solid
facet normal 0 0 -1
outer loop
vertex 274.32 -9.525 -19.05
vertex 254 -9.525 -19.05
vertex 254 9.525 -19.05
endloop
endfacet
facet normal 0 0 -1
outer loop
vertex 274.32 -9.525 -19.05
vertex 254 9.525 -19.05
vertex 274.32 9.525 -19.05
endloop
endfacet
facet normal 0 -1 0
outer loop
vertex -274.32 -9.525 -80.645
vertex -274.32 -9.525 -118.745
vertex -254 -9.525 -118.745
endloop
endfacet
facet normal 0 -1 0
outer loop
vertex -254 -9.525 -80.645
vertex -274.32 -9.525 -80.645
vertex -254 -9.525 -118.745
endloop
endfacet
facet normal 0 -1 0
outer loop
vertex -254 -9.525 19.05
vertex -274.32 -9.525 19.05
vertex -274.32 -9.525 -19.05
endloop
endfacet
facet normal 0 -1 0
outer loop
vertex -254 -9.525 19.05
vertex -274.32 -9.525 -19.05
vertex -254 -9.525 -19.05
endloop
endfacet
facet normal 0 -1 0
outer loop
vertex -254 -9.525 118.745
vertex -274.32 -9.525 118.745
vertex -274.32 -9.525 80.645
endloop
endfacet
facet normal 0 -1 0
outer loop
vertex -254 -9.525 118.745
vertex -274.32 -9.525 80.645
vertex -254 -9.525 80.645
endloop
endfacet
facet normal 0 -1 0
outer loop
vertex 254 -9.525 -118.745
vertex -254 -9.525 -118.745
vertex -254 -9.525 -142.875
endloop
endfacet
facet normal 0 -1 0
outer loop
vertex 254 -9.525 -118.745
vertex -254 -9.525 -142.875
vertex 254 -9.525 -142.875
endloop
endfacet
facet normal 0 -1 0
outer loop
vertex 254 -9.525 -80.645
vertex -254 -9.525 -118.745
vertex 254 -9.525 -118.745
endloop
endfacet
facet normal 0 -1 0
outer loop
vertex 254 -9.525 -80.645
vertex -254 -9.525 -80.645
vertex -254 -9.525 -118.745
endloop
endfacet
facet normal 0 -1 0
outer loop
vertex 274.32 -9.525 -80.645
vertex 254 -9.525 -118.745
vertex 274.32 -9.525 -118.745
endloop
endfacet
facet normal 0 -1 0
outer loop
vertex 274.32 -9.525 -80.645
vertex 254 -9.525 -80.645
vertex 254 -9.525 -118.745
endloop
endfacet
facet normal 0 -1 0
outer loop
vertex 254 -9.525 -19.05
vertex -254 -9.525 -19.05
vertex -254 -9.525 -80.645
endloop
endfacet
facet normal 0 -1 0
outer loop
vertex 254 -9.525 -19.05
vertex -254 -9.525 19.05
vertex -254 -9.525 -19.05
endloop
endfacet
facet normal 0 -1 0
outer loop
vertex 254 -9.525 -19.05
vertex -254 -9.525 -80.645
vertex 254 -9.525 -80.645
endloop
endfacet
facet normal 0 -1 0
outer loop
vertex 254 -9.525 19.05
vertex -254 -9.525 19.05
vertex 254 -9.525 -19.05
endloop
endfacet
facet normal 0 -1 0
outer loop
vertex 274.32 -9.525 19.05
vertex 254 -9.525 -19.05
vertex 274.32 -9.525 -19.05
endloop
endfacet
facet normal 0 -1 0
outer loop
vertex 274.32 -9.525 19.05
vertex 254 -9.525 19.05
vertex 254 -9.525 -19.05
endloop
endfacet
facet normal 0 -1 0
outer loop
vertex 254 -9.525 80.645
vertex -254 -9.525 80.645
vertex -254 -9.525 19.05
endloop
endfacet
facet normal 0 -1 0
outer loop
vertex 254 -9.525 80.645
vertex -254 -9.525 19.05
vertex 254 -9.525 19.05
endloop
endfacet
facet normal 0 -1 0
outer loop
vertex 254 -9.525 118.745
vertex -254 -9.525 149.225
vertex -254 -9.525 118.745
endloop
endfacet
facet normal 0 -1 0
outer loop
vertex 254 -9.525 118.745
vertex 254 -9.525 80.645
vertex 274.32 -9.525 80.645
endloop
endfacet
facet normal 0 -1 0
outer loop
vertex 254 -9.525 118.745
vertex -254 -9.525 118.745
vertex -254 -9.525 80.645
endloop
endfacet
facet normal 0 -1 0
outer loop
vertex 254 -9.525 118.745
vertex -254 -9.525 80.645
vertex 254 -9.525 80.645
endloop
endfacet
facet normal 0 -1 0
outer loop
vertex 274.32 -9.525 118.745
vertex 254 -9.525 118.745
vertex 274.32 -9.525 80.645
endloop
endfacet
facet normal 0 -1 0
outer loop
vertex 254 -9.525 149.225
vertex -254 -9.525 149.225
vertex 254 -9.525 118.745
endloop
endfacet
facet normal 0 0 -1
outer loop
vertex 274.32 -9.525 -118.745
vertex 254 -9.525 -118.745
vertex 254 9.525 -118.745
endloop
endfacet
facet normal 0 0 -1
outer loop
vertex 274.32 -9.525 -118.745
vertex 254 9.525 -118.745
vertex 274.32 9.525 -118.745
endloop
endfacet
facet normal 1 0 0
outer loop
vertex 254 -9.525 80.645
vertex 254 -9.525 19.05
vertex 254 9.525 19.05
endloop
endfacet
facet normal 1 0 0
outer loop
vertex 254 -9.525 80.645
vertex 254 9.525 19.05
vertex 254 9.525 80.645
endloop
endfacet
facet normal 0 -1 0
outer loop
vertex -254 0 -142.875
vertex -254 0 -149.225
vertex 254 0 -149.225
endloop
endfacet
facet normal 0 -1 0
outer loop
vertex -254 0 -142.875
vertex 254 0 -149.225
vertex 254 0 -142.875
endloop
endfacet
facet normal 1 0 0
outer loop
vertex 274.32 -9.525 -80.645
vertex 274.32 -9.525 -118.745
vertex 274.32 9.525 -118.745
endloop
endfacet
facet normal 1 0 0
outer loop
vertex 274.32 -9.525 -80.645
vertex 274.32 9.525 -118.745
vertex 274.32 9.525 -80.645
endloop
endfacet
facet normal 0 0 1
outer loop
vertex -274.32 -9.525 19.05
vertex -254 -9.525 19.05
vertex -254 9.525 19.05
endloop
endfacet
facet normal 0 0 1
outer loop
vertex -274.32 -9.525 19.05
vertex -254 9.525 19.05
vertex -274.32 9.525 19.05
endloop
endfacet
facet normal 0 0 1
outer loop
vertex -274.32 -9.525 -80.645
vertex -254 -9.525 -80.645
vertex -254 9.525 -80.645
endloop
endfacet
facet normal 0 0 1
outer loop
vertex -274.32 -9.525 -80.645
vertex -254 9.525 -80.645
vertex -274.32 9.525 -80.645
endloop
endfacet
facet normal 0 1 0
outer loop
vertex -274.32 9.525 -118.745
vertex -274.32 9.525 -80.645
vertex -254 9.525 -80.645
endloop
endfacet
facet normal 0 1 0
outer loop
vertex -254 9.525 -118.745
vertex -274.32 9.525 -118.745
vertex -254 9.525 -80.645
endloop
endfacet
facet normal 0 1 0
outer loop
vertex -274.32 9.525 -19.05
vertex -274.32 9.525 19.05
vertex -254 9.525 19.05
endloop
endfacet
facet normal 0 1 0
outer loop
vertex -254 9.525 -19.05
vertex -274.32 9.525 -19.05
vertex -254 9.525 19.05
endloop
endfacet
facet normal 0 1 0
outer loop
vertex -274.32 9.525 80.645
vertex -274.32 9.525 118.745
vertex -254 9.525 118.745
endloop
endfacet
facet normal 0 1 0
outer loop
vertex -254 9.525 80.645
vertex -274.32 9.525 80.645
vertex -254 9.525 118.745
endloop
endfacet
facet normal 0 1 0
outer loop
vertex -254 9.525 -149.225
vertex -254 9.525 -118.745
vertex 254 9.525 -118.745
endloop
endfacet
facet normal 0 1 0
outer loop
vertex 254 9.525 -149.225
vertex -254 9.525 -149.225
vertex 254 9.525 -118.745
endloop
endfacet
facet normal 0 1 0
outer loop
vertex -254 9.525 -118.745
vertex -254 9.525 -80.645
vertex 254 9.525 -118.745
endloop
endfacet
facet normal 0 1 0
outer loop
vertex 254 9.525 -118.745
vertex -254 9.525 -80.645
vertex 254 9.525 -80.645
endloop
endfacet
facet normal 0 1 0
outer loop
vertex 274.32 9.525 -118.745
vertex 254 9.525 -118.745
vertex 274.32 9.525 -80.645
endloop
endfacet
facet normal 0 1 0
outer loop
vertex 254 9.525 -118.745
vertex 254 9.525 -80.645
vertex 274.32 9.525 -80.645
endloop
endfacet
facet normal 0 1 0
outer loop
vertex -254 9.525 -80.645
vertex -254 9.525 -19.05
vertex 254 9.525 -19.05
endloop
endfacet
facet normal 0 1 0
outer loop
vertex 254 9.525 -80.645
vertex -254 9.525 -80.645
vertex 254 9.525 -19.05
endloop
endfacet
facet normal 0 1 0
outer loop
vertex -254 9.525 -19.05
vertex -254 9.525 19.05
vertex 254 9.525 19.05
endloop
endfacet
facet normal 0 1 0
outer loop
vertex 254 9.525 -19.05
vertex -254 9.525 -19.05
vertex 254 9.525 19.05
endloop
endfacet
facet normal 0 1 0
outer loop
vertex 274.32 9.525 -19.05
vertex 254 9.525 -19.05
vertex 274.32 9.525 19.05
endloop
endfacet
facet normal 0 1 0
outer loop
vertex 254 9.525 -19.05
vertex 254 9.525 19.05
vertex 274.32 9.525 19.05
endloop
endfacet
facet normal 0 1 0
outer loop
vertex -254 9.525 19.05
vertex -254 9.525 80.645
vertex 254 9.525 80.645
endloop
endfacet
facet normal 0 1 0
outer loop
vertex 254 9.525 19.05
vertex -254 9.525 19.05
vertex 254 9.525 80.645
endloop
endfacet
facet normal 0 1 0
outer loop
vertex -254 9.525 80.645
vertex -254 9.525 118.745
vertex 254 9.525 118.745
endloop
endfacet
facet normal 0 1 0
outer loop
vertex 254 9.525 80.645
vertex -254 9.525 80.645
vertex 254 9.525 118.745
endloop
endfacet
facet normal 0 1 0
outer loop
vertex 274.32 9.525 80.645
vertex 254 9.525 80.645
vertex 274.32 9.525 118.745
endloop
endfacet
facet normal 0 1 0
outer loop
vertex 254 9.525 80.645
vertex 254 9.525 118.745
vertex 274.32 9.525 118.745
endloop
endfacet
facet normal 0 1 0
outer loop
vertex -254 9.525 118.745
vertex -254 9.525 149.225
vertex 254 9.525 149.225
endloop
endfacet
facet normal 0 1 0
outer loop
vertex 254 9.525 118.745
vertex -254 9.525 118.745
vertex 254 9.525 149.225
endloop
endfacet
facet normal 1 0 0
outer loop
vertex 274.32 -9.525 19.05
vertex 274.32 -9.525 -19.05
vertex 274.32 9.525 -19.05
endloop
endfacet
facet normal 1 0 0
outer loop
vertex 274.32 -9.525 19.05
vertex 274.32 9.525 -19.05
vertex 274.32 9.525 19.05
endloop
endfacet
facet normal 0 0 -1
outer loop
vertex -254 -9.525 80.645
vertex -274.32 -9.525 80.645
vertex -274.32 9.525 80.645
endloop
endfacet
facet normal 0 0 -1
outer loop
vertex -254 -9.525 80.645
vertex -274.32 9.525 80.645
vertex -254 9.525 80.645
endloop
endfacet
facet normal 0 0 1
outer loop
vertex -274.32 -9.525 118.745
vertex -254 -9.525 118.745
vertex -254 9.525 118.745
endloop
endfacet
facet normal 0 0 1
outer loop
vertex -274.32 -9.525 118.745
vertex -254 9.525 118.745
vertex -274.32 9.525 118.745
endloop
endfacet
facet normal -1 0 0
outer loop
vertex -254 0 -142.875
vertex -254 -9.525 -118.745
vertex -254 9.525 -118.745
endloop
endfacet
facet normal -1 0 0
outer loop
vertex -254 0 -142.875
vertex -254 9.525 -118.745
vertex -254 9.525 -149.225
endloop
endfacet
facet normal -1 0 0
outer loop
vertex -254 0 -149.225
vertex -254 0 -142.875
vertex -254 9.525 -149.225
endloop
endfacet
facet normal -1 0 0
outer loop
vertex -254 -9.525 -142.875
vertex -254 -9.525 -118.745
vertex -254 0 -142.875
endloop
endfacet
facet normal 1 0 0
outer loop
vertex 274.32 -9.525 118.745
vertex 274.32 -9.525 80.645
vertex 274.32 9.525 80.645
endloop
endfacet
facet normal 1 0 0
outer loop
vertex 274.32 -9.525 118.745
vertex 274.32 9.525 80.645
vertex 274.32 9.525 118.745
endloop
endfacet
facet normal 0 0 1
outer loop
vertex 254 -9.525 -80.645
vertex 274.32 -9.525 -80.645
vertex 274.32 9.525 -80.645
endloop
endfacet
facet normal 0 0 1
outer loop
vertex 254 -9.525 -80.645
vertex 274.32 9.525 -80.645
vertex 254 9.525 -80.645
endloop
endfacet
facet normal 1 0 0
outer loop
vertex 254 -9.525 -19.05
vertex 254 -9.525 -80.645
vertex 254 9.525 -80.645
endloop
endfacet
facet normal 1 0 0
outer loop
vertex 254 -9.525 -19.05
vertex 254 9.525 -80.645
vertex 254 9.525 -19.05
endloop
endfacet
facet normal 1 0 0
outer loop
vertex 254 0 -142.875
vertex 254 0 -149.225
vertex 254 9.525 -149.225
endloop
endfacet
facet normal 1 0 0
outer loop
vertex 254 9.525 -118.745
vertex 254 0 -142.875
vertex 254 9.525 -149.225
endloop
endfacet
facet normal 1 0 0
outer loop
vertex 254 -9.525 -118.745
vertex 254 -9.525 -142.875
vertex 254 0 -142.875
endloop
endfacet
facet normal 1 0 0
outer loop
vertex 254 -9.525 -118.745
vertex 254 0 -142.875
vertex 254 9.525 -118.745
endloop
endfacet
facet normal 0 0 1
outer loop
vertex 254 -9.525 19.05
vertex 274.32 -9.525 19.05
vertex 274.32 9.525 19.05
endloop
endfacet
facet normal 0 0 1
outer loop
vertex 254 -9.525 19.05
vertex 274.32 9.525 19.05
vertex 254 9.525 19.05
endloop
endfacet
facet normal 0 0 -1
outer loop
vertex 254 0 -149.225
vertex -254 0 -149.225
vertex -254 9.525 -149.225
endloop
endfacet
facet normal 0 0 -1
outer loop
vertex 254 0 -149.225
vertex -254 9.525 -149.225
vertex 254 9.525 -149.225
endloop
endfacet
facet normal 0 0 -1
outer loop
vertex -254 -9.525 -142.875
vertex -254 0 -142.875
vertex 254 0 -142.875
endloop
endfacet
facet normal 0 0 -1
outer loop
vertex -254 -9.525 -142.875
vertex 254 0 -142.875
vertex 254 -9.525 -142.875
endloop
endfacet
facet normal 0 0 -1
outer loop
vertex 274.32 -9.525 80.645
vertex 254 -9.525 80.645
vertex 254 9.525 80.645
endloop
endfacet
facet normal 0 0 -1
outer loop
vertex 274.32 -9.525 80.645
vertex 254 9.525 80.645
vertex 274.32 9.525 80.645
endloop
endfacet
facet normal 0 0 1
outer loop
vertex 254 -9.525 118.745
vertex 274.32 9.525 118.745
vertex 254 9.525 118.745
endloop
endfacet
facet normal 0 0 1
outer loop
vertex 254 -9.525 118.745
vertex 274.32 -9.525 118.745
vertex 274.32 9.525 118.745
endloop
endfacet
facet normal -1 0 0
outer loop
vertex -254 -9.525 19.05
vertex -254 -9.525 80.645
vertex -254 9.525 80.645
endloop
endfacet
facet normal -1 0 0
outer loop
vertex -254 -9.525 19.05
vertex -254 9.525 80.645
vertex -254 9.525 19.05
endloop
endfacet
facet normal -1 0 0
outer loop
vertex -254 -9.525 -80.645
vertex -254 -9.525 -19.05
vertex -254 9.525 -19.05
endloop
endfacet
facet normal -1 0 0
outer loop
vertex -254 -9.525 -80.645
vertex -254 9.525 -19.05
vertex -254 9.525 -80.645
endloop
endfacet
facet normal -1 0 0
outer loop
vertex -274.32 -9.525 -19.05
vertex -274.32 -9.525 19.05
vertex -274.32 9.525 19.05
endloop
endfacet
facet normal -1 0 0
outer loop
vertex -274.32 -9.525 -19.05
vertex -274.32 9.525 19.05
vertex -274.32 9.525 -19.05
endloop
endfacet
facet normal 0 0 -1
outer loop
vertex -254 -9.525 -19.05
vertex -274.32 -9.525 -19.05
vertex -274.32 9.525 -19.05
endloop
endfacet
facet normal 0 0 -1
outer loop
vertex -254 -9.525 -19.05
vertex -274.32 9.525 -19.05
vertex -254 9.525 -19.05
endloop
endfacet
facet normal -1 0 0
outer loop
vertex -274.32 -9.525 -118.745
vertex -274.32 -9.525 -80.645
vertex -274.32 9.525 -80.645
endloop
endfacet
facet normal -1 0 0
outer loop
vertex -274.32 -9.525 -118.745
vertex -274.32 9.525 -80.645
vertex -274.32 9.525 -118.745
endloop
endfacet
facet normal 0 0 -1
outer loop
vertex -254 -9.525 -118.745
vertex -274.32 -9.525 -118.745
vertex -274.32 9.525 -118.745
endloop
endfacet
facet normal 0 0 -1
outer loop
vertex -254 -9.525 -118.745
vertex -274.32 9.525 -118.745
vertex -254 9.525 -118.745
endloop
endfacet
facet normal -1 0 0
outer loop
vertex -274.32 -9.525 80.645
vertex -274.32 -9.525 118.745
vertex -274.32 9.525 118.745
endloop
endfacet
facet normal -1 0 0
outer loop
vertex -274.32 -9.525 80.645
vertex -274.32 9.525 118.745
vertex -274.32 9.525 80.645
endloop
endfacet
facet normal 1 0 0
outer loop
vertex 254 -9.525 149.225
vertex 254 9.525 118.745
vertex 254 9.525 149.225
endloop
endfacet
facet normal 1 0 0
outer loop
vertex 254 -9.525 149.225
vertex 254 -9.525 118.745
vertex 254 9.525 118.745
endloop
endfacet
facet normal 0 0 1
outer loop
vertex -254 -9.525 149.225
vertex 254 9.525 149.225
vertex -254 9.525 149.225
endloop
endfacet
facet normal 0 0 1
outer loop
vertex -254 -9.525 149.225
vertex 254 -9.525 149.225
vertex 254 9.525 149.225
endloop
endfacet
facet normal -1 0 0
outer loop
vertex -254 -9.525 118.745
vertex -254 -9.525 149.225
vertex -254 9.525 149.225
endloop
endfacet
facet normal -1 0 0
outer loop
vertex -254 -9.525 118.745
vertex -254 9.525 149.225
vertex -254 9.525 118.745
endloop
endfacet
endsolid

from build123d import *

# Parameters (mm, degrees)
F1_DEPTH = 9.525
F2_W     = 9.525
F2_H     = 6.35
F3_DEPTH = 528.321


with BuildPart() as f1:
    # F0 (on Front) → F1 (new body, symmetric)
    with BuildSketch(Plane.XZ):
        Polygon((254, 149.225), (-254, 149.225), (-254, 118.745), (-274.32, 118.745), (-274.32, 80.645), (-254, 80.645), (-254, 19.05), (-274.32, 19.05), (-274.32, -19.05), (-254, -19.05), (-254, -80.645), (-274.32, -80.645), (-274.32, -118.745), (-254, -118.745), (-254, -149.225), (254, -149.225), (254, -118.745), (274.32, -118.745), (274.32, -80.645), (254, -80.645), (254, -19.05), (274.32, -19.05), (274.32, 19.05), (254, 19.05), (254, 80.645), (274.32, 80.645), (274.32, 118.745), (254, 118.745), align=None)
    extrude(amount=F1_DEPTH, both=True)

    # F2 (on face) → F3 (cut, through all)
    with BuildSketch(Plane(origin=(-254, 0, 0), x_dir=(0, -1, 0), z_dir=(-1, 0, 0))):
        with Locations((4.7625, -146.05)):
            Rectangle(F2_W, F2_H)
    extrude(amount=-F3_DEPTH, mode=Mode.SUBTRACT)


solid = f1.part
